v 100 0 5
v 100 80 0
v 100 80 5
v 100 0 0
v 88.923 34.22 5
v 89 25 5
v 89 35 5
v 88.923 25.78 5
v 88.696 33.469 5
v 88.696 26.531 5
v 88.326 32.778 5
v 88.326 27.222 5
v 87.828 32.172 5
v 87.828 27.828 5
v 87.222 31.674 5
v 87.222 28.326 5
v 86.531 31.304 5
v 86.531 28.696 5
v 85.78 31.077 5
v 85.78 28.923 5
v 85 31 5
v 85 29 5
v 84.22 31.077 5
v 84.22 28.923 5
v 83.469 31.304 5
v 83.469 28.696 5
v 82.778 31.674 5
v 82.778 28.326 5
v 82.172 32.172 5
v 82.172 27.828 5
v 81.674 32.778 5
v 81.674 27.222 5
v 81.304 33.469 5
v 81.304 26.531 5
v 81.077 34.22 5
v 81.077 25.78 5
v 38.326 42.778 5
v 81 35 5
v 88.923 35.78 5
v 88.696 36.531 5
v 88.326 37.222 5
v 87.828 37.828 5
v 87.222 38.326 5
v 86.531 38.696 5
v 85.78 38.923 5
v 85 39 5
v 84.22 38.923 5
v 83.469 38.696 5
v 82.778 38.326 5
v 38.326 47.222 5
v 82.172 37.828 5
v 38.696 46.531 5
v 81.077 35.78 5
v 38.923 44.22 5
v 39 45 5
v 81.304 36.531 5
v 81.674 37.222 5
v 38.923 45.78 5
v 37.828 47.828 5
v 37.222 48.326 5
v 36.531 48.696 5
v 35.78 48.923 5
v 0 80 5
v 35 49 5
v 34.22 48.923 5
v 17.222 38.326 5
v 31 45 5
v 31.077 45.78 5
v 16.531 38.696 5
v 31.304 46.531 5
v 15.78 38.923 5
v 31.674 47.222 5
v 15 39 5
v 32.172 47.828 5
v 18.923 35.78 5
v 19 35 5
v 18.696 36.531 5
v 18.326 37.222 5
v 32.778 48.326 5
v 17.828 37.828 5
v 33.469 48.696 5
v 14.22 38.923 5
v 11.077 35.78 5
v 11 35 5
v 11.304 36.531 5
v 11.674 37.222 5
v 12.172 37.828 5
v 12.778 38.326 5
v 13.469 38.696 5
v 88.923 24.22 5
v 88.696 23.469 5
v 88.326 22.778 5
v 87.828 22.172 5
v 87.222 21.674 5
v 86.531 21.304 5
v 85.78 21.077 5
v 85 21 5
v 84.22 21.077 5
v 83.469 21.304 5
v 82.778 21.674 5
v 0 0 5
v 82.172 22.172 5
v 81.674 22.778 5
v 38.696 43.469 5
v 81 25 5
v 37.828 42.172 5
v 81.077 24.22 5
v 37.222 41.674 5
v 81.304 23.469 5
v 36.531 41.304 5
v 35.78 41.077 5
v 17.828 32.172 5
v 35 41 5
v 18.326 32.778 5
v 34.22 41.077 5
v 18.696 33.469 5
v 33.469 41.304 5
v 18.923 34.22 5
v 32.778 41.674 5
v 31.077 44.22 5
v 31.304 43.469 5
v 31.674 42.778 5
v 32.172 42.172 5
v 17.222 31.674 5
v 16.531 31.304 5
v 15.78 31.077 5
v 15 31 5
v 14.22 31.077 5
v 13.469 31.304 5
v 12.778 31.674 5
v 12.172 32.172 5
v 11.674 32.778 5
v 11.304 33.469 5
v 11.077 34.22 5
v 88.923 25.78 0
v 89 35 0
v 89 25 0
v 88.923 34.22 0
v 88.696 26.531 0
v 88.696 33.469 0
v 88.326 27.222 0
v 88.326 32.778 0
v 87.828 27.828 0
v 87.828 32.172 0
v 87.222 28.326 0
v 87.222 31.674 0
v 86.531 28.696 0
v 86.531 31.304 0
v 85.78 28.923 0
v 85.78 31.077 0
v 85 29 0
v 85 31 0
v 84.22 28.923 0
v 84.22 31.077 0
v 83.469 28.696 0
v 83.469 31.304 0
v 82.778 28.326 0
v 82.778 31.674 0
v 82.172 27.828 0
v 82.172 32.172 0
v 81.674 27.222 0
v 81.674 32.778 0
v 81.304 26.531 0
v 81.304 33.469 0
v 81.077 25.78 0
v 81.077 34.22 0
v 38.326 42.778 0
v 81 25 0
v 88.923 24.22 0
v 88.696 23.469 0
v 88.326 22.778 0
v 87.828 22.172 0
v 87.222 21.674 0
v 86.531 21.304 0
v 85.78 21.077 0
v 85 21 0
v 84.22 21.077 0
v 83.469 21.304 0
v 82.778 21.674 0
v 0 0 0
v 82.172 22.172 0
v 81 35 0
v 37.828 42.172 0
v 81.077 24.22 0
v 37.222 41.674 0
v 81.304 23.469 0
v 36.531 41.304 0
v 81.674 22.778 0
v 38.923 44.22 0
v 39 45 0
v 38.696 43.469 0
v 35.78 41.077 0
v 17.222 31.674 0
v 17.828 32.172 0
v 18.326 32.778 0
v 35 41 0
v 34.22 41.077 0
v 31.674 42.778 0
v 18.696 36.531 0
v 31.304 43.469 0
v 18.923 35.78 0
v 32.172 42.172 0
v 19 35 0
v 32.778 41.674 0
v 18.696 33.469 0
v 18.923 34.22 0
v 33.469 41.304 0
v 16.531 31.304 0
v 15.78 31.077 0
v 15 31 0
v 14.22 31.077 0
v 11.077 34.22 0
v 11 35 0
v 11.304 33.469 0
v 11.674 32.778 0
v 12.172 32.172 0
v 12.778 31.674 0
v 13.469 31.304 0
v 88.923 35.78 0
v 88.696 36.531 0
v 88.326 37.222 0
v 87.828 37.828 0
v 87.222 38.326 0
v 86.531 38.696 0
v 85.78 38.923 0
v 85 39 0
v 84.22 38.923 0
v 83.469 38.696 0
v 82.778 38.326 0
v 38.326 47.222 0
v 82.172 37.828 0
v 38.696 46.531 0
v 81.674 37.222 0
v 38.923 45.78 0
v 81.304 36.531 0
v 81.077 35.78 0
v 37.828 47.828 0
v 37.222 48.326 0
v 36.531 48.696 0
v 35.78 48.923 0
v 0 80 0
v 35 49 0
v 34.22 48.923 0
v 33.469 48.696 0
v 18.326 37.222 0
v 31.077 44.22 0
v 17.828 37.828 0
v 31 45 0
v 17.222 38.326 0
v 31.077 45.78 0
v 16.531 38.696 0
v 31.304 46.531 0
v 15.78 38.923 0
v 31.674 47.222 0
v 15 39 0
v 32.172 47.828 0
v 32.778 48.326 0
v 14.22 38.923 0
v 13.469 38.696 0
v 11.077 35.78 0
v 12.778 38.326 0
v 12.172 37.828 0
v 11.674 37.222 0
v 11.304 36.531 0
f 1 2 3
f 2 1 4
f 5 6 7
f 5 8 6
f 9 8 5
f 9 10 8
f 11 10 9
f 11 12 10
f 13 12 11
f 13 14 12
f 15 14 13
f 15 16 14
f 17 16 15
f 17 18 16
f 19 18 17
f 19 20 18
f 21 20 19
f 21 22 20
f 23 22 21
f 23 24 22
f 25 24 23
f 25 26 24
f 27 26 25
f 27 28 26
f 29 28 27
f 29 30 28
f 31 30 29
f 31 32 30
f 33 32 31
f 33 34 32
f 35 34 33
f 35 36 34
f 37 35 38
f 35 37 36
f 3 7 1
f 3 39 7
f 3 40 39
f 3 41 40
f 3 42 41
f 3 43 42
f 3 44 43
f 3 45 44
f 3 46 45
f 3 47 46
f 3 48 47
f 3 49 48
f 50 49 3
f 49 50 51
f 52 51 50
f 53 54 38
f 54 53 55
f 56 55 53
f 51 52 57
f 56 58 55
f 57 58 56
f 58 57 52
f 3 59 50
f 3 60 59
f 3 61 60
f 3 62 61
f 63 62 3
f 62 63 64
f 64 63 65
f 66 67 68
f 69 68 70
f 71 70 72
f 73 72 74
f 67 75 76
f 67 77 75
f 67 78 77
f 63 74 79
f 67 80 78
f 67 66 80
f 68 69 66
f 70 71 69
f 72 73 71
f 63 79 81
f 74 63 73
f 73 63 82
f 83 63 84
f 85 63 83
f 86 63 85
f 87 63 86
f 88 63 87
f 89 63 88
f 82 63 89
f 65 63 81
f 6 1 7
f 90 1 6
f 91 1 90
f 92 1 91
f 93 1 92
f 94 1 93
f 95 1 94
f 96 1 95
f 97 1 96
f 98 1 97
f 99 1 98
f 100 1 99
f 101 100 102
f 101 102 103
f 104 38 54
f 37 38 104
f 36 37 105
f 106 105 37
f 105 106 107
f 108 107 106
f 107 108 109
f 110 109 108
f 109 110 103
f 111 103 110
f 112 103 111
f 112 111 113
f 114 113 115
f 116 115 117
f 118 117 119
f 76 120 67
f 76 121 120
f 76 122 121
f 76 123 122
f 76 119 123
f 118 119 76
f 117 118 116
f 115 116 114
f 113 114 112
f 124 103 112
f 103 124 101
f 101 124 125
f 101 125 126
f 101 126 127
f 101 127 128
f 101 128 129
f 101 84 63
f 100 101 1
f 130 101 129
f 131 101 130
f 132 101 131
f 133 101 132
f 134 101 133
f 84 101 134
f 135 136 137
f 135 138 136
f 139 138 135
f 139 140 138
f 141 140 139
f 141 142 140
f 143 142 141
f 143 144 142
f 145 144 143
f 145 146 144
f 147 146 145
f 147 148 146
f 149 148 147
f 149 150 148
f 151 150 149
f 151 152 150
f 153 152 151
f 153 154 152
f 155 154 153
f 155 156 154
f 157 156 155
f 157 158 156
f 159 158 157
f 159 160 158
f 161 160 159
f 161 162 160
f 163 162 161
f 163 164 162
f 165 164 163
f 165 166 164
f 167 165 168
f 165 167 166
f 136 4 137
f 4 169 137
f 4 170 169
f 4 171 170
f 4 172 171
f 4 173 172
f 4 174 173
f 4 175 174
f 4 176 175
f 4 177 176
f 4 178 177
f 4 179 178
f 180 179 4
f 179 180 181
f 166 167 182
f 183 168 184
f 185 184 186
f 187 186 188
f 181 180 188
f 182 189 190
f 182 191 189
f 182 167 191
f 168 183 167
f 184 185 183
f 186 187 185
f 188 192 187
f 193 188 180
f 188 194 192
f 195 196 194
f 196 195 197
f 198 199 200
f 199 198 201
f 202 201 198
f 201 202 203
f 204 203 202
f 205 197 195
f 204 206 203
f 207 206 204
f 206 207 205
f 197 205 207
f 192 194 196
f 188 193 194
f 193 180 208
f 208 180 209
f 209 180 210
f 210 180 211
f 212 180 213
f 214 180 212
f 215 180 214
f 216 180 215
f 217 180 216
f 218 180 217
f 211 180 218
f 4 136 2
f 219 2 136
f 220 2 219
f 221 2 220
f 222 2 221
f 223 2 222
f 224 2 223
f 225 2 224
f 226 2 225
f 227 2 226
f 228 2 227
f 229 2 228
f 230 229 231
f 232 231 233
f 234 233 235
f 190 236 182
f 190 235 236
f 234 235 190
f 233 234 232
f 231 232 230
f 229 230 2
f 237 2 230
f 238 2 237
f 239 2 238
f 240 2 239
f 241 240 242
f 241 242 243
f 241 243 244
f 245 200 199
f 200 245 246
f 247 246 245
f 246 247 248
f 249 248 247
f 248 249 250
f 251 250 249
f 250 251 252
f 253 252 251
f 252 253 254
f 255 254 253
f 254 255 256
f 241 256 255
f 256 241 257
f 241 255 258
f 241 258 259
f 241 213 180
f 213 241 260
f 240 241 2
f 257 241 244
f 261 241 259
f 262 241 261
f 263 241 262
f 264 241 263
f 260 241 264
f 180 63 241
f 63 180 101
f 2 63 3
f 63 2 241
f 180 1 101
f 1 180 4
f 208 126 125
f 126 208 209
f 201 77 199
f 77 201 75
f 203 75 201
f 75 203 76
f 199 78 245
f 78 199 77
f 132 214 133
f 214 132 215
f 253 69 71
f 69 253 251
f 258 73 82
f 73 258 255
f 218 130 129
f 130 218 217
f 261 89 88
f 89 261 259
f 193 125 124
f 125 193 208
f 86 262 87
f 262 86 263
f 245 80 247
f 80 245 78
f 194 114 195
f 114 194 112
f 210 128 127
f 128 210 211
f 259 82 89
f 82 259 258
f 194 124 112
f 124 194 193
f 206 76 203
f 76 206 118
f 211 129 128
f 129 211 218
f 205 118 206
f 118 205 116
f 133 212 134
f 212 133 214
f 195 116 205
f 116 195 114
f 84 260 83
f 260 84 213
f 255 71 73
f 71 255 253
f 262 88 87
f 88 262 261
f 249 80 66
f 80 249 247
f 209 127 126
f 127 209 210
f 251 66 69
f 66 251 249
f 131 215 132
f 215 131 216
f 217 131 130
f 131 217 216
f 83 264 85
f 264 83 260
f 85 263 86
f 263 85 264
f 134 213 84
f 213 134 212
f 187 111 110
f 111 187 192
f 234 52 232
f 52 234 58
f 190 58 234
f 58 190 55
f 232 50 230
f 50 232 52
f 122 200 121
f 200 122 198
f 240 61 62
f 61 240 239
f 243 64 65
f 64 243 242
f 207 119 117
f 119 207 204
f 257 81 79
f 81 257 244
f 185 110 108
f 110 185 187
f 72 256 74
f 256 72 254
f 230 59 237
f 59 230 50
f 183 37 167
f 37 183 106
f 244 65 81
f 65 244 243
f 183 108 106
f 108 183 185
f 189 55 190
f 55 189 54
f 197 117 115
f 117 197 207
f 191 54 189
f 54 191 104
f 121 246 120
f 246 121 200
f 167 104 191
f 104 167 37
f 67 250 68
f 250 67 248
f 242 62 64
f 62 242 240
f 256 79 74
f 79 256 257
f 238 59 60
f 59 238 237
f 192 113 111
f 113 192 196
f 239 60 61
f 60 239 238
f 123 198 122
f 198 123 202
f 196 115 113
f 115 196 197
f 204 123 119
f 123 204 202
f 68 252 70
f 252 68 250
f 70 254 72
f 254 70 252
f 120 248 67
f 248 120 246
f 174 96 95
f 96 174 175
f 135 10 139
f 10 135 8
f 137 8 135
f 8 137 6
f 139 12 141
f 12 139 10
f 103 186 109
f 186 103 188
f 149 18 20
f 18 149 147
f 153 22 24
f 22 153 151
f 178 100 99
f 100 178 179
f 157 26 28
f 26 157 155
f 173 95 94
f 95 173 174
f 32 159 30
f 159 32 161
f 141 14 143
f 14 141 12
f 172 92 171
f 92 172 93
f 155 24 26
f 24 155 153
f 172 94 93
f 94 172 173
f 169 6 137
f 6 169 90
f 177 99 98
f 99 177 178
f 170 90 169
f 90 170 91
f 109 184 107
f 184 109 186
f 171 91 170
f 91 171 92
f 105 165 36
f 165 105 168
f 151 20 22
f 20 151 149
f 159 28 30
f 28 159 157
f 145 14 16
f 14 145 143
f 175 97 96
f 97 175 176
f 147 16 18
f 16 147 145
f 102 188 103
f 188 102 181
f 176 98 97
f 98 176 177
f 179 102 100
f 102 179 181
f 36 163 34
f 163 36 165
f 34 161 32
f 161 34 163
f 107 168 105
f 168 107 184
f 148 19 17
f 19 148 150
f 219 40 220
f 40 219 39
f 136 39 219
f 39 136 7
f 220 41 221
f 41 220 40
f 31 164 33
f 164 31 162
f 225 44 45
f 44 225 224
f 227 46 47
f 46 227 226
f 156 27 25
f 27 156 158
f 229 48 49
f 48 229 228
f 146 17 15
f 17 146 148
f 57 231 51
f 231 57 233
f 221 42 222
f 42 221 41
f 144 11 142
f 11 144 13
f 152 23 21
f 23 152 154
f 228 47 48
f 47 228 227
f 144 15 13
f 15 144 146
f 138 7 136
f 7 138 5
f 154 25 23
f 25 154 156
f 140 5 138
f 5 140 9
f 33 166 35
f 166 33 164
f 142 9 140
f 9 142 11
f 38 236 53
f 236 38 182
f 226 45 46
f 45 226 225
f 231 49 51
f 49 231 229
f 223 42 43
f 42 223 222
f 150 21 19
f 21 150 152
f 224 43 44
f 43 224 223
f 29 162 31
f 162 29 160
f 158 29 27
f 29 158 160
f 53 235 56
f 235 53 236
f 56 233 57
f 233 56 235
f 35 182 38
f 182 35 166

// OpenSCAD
$fn = 32;

// ----------------------------------------------------------------------
// Hole field: plate with holes at given coordinates
// ----------------------------------------------------------------------

// --- parameters (mm) ---
plate_l = 100;            // plate length, X
plate_w = 80;             // plate width, Y
plate_t = 5;              // plate thickness, Z
hole_d = 8;               // hole diameter
fit_tol = 0.02;           // tolerance for press fits, mm
free_tol = 0.2;           // tolerance for clearance fits, mm

difference() {
  cube([plate_l, plate_w, plate_t]);
  translate([15, 35, -1]) cylinder(h = plate_t + 2, d = hole_d);
  translate([35, 45, -1]) cylinder(h = plate_t + 2, d = hole_d);
  translate([85, 25, -1]) cylinder(h = plate_t + 2, d = hole_d);
  translate([85, 35, -1]) cylinder(h = plate_t + 2, d = hole_d);
}
